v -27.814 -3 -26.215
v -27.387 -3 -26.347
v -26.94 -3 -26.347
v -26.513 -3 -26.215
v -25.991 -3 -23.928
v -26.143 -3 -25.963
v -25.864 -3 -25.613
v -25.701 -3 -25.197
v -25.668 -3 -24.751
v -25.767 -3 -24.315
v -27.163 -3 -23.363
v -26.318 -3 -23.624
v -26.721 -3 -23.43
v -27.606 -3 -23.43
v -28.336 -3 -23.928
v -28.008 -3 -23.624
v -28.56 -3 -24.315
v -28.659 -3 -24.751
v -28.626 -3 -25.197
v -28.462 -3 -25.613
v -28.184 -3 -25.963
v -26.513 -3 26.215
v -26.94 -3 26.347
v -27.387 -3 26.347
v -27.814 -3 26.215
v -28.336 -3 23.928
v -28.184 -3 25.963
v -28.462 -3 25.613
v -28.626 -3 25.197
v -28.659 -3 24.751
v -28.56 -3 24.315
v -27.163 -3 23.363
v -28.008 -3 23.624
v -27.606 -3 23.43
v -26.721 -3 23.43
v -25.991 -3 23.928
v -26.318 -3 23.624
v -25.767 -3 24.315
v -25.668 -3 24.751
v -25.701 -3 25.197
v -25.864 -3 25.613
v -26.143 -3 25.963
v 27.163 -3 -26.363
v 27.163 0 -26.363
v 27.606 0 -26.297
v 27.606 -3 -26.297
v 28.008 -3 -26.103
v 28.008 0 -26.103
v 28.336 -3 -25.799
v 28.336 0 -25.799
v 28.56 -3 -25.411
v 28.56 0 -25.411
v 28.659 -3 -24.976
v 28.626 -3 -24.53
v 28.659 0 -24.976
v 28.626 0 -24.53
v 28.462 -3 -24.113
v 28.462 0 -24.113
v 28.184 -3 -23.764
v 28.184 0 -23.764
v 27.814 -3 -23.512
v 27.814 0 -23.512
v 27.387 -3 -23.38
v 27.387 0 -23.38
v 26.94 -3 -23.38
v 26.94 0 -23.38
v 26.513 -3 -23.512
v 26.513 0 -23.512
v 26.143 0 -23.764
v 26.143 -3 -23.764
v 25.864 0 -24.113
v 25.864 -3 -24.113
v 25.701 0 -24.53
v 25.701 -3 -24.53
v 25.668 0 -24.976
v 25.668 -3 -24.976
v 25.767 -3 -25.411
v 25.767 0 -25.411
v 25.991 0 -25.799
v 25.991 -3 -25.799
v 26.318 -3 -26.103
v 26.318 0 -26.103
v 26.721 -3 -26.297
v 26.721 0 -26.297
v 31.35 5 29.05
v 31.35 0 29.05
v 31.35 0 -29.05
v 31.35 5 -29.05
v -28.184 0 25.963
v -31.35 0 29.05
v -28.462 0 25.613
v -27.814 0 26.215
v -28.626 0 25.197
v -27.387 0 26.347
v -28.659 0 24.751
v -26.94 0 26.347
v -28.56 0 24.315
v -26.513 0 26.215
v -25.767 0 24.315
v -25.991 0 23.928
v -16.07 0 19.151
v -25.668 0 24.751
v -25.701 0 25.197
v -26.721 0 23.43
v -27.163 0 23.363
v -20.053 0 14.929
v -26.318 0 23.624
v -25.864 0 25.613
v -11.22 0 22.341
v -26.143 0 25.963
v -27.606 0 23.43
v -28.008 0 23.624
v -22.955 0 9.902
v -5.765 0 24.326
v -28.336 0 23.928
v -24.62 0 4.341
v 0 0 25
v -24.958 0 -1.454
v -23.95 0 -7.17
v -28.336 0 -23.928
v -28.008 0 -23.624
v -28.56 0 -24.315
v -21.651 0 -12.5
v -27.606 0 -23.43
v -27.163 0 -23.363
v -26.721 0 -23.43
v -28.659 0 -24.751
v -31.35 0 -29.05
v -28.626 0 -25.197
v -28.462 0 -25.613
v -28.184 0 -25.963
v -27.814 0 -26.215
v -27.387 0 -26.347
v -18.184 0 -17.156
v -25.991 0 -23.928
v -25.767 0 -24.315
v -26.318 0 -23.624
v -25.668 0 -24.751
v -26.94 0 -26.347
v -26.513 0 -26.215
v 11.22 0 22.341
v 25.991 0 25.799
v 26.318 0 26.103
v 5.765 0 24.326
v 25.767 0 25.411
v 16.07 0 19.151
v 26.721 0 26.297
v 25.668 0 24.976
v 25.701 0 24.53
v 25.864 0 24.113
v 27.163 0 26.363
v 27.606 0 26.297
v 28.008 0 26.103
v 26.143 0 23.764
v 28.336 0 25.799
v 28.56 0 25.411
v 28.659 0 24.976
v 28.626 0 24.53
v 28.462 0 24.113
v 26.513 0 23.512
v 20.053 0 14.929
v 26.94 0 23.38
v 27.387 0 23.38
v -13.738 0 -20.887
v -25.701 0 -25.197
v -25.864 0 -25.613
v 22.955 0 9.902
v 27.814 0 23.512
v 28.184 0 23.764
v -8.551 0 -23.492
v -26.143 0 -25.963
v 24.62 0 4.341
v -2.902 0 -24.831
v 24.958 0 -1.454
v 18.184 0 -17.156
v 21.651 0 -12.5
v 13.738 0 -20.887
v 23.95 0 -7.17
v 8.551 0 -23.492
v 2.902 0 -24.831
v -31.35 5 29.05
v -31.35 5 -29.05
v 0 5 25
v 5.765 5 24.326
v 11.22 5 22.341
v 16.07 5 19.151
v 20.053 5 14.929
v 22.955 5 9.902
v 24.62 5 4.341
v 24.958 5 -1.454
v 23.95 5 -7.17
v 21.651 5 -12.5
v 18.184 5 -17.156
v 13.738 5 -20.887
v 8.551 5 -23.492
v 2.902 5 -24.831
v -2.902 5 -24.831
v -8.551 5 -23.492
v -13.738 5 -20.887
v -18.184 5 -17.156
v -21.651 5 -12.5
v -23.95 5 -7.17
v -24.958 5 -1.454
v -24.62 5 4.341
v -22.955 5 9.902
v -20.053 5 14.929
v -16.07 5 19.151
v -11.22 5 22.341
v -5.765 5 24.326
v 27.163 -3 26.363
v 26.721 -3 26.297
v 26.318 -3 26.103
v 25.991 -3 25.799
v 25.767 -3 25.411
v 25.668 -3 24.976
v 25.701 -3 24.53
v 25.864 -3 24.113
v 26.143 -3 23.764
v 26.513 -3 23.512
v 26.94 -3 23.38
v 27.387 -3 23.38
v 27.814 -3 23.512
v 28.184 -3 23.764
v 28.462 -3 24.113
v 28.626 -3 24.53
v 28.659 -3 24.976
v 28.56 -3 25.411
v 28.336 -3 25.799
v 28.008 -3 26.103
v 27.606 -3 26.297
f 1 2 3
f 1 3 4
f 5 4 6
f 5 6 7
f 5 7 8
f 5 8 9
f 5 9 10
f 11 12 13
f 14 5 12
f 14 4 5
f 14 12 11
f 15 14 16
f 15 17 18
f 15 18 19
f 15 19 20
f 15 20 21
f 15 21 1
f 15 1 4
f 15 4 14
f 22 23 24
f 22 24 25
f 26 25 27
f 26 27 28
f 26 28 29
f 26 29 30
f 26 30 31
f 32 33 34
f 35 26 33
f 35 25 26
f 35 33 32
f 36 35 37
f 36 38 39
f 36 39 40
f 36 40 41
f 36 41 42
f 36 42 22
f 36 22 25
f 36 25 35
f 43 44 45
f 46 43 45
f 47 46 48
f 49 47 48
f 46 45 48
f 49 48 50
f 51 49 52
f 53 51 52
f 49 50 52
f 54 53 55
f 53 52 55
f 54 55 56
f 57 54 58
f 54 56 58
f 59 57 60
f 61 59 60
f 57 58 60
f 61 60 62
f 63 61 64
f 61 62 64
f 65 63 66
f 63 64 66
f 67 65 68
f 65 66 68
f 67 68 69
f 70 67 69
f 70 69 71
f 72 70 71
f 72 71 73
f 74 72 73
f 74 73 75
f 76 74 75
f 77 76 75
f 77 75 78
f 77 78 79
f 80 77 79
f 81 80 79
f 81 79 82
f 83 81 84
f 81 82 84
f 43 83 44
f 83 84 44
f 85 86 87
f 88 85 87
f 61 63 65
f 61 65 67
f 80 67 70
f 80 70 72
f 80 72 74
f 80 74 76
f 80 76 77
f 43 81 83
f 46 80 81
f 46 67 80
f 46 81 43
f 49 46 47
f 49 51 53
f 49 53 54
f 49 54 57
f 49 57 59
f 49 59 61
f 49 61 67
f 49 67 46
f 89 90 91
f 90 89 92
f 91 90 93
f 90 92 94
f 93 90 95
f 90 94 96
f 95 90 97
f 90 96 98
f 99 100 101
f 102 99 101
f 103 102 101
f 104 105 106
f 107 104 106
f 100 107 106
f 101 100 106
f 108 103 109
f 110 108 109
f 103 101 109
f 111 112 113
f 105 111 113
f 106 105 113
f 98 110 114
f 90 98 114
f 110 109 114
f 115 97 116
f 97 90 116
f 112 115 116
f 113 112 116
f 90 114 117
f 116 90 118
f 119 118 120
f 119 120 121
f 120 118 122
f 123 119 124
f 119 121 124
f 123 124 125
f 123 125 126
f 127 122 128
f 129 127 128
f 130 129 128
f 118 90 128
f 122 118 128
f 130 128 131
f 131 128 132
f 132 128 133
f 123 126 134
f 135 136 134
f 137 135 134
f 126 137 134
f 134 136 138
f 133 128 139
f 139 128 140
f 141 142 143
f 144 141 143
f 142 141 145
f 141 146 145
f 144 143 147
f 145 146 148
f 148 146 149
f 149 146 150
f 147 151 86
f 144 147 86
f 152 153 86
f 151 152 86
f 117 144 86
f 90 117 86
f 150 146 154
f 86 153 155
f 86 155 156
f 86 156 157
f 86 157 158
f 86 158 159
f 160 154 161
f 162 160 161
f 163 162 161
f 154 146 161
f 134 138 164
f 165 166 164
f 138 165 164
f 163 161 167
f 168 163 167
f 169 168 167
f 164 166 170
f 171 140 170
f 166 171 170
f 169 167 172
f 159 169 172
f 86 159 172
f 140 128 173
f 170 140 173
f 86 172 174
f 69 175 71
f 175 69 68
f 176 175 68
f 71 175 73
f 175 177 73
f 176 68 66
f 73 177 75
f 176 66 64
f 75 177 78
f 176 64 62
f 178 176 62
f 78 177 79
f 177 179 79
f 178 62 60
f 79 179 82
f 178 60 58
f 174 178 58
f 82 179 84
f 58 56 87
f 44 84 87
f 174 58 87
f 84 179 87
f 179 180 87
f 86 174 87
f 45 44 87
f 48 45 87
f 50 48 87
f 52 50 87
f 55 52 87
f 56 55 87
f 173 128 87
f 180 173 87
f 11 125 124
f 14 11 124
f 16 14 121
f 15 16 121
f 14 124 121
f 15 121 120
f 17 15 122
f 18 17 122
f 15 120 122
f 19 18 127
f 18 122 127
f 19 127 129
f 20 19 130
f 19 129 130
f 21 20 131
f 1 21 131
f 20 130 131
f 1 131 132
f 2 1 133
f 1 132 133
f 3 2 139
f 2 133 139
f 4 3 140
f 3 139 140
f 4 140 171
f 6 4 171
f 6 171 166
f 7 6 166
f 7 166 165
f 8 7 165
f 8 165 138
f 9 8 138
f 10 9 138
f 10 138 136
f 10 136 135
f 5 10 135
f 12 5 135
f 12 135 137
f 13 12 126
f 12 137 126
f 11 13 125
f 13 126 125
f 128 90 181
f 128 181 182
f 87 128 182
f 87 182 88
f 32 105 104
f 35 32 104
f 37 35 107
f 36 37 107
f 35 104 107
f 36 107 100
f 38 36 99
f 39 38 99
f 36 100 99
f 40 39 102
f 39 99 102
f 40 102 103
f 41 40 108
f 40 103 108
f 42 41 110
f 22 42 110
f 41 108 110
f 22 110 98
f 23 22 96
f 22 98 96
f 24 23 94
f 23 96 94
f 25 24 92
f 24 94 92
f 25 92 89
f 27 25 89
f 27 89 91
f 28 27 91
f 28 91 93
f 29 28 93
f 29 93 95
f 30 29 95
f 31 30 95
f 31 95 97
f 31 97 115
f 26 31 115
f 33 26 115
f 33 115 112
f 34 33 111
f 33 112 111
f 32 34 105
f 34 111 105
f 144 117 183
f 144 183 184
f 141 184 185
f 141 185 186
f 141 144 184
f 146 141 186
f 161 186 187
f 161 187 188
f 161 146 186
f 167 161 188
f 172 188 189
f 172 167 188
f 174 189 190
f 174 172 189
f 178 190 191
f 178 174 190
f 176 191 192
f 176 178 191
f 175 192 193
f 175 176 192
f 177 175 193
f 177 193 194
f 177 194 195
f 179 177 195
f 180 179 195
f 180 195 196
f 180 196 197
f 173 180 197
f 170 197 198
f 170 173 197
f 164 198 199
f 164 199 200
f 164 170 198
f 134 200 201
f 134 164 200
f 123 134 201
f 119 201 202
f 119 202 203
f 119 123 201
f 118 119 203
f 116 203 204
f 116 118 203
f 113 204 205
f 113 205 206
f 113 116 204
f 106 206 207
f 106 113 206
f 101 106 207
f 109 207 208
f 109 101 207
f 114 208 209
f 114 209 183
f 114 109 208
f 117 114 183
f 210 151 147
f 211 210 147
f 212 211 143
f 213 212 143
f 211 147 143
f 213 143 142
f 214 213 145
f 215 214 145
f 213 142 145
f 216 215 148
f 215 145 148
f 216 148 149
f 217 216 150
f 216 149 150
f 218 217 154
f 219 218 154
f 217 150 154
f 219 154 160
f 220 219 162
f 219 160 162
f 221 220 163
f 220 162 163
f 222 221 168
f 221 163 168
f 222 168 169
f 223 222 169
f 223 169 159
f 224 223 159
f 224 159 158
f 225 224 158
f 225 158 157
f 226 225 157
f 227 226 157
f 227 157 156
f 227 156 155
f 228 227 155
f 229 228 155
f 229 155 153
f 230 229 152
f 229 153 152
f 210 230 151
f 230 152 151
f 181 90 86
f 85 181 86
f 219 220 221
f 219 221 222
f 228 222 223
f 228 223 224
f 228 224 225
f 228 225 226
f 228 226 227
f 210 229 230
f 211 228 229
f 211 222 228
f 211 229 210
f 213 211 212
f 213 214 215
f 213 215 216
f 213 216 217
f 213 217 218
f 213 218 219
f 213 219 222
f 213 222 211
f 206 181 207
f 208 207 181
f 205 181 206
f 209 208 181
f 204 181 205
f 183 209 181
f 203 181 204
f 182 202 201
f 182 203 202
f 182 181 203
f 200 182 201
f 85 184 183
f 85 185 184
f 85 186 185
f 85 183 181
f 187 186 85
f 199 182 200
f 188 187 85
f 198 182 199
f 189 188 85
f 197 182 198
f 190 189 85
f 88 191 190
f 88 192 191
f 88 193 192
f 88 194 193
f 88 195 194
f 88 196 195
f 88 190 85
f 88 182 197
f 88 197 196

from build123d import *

# Parameters (mm, degrees)
SKETCH1_W           = 62.7
SKETCH1_H           = 58.1
SKETCH1_R           = 25
BOSS_EXTRUDE1_DEPTH = 5
SKETCH2_R           = 1.5
BOSS_EXTRUDE2_DEPTH = 3


with BuildPart() as part:
    # Sketch1 → Boss-Extrude1 (new body)
    with BuildSketch(Plane(origin=(0, 0, 0), x_dir=(1, 0, 0), z_dir=(0, 1, 0))):
        Rectangle(SKETCH1_W, SKETCH1_H)
        with Locations(Location((0, 0, 0), (0, 0, 270))):
            Circle(SKETCH1_R, mode=Mode.SUBTRACT)
    extrude(amount=BOSS_EXTRUDE1_DEPTH)

    # Sketch2 → Boss-Extrude2 (add)
    with BuildSketch(Plane.XZ):
        with Locations(Location((-27.163407974, 24.863407974, 0), (0, 0, 270))):
            Circle(SKETCH2_R)
        with Locations(Location((27.163407974, 24.863407974, 0), (0, 0, 90))):
            Circle(SKETCH2_R)
        with Locations(Location((27.163407974, -24.863407974, 0), (0, 0, 270))):
            Circle(SKETCH2_R)
        with Locations(Location((-27.163407974, -24.863407974, 0), (0, 0, 90))):
            Circle(SKETCH2_R)
    extrude(amount=BOSS_EXTRUDE2_DEPTH)


solid = part.part
